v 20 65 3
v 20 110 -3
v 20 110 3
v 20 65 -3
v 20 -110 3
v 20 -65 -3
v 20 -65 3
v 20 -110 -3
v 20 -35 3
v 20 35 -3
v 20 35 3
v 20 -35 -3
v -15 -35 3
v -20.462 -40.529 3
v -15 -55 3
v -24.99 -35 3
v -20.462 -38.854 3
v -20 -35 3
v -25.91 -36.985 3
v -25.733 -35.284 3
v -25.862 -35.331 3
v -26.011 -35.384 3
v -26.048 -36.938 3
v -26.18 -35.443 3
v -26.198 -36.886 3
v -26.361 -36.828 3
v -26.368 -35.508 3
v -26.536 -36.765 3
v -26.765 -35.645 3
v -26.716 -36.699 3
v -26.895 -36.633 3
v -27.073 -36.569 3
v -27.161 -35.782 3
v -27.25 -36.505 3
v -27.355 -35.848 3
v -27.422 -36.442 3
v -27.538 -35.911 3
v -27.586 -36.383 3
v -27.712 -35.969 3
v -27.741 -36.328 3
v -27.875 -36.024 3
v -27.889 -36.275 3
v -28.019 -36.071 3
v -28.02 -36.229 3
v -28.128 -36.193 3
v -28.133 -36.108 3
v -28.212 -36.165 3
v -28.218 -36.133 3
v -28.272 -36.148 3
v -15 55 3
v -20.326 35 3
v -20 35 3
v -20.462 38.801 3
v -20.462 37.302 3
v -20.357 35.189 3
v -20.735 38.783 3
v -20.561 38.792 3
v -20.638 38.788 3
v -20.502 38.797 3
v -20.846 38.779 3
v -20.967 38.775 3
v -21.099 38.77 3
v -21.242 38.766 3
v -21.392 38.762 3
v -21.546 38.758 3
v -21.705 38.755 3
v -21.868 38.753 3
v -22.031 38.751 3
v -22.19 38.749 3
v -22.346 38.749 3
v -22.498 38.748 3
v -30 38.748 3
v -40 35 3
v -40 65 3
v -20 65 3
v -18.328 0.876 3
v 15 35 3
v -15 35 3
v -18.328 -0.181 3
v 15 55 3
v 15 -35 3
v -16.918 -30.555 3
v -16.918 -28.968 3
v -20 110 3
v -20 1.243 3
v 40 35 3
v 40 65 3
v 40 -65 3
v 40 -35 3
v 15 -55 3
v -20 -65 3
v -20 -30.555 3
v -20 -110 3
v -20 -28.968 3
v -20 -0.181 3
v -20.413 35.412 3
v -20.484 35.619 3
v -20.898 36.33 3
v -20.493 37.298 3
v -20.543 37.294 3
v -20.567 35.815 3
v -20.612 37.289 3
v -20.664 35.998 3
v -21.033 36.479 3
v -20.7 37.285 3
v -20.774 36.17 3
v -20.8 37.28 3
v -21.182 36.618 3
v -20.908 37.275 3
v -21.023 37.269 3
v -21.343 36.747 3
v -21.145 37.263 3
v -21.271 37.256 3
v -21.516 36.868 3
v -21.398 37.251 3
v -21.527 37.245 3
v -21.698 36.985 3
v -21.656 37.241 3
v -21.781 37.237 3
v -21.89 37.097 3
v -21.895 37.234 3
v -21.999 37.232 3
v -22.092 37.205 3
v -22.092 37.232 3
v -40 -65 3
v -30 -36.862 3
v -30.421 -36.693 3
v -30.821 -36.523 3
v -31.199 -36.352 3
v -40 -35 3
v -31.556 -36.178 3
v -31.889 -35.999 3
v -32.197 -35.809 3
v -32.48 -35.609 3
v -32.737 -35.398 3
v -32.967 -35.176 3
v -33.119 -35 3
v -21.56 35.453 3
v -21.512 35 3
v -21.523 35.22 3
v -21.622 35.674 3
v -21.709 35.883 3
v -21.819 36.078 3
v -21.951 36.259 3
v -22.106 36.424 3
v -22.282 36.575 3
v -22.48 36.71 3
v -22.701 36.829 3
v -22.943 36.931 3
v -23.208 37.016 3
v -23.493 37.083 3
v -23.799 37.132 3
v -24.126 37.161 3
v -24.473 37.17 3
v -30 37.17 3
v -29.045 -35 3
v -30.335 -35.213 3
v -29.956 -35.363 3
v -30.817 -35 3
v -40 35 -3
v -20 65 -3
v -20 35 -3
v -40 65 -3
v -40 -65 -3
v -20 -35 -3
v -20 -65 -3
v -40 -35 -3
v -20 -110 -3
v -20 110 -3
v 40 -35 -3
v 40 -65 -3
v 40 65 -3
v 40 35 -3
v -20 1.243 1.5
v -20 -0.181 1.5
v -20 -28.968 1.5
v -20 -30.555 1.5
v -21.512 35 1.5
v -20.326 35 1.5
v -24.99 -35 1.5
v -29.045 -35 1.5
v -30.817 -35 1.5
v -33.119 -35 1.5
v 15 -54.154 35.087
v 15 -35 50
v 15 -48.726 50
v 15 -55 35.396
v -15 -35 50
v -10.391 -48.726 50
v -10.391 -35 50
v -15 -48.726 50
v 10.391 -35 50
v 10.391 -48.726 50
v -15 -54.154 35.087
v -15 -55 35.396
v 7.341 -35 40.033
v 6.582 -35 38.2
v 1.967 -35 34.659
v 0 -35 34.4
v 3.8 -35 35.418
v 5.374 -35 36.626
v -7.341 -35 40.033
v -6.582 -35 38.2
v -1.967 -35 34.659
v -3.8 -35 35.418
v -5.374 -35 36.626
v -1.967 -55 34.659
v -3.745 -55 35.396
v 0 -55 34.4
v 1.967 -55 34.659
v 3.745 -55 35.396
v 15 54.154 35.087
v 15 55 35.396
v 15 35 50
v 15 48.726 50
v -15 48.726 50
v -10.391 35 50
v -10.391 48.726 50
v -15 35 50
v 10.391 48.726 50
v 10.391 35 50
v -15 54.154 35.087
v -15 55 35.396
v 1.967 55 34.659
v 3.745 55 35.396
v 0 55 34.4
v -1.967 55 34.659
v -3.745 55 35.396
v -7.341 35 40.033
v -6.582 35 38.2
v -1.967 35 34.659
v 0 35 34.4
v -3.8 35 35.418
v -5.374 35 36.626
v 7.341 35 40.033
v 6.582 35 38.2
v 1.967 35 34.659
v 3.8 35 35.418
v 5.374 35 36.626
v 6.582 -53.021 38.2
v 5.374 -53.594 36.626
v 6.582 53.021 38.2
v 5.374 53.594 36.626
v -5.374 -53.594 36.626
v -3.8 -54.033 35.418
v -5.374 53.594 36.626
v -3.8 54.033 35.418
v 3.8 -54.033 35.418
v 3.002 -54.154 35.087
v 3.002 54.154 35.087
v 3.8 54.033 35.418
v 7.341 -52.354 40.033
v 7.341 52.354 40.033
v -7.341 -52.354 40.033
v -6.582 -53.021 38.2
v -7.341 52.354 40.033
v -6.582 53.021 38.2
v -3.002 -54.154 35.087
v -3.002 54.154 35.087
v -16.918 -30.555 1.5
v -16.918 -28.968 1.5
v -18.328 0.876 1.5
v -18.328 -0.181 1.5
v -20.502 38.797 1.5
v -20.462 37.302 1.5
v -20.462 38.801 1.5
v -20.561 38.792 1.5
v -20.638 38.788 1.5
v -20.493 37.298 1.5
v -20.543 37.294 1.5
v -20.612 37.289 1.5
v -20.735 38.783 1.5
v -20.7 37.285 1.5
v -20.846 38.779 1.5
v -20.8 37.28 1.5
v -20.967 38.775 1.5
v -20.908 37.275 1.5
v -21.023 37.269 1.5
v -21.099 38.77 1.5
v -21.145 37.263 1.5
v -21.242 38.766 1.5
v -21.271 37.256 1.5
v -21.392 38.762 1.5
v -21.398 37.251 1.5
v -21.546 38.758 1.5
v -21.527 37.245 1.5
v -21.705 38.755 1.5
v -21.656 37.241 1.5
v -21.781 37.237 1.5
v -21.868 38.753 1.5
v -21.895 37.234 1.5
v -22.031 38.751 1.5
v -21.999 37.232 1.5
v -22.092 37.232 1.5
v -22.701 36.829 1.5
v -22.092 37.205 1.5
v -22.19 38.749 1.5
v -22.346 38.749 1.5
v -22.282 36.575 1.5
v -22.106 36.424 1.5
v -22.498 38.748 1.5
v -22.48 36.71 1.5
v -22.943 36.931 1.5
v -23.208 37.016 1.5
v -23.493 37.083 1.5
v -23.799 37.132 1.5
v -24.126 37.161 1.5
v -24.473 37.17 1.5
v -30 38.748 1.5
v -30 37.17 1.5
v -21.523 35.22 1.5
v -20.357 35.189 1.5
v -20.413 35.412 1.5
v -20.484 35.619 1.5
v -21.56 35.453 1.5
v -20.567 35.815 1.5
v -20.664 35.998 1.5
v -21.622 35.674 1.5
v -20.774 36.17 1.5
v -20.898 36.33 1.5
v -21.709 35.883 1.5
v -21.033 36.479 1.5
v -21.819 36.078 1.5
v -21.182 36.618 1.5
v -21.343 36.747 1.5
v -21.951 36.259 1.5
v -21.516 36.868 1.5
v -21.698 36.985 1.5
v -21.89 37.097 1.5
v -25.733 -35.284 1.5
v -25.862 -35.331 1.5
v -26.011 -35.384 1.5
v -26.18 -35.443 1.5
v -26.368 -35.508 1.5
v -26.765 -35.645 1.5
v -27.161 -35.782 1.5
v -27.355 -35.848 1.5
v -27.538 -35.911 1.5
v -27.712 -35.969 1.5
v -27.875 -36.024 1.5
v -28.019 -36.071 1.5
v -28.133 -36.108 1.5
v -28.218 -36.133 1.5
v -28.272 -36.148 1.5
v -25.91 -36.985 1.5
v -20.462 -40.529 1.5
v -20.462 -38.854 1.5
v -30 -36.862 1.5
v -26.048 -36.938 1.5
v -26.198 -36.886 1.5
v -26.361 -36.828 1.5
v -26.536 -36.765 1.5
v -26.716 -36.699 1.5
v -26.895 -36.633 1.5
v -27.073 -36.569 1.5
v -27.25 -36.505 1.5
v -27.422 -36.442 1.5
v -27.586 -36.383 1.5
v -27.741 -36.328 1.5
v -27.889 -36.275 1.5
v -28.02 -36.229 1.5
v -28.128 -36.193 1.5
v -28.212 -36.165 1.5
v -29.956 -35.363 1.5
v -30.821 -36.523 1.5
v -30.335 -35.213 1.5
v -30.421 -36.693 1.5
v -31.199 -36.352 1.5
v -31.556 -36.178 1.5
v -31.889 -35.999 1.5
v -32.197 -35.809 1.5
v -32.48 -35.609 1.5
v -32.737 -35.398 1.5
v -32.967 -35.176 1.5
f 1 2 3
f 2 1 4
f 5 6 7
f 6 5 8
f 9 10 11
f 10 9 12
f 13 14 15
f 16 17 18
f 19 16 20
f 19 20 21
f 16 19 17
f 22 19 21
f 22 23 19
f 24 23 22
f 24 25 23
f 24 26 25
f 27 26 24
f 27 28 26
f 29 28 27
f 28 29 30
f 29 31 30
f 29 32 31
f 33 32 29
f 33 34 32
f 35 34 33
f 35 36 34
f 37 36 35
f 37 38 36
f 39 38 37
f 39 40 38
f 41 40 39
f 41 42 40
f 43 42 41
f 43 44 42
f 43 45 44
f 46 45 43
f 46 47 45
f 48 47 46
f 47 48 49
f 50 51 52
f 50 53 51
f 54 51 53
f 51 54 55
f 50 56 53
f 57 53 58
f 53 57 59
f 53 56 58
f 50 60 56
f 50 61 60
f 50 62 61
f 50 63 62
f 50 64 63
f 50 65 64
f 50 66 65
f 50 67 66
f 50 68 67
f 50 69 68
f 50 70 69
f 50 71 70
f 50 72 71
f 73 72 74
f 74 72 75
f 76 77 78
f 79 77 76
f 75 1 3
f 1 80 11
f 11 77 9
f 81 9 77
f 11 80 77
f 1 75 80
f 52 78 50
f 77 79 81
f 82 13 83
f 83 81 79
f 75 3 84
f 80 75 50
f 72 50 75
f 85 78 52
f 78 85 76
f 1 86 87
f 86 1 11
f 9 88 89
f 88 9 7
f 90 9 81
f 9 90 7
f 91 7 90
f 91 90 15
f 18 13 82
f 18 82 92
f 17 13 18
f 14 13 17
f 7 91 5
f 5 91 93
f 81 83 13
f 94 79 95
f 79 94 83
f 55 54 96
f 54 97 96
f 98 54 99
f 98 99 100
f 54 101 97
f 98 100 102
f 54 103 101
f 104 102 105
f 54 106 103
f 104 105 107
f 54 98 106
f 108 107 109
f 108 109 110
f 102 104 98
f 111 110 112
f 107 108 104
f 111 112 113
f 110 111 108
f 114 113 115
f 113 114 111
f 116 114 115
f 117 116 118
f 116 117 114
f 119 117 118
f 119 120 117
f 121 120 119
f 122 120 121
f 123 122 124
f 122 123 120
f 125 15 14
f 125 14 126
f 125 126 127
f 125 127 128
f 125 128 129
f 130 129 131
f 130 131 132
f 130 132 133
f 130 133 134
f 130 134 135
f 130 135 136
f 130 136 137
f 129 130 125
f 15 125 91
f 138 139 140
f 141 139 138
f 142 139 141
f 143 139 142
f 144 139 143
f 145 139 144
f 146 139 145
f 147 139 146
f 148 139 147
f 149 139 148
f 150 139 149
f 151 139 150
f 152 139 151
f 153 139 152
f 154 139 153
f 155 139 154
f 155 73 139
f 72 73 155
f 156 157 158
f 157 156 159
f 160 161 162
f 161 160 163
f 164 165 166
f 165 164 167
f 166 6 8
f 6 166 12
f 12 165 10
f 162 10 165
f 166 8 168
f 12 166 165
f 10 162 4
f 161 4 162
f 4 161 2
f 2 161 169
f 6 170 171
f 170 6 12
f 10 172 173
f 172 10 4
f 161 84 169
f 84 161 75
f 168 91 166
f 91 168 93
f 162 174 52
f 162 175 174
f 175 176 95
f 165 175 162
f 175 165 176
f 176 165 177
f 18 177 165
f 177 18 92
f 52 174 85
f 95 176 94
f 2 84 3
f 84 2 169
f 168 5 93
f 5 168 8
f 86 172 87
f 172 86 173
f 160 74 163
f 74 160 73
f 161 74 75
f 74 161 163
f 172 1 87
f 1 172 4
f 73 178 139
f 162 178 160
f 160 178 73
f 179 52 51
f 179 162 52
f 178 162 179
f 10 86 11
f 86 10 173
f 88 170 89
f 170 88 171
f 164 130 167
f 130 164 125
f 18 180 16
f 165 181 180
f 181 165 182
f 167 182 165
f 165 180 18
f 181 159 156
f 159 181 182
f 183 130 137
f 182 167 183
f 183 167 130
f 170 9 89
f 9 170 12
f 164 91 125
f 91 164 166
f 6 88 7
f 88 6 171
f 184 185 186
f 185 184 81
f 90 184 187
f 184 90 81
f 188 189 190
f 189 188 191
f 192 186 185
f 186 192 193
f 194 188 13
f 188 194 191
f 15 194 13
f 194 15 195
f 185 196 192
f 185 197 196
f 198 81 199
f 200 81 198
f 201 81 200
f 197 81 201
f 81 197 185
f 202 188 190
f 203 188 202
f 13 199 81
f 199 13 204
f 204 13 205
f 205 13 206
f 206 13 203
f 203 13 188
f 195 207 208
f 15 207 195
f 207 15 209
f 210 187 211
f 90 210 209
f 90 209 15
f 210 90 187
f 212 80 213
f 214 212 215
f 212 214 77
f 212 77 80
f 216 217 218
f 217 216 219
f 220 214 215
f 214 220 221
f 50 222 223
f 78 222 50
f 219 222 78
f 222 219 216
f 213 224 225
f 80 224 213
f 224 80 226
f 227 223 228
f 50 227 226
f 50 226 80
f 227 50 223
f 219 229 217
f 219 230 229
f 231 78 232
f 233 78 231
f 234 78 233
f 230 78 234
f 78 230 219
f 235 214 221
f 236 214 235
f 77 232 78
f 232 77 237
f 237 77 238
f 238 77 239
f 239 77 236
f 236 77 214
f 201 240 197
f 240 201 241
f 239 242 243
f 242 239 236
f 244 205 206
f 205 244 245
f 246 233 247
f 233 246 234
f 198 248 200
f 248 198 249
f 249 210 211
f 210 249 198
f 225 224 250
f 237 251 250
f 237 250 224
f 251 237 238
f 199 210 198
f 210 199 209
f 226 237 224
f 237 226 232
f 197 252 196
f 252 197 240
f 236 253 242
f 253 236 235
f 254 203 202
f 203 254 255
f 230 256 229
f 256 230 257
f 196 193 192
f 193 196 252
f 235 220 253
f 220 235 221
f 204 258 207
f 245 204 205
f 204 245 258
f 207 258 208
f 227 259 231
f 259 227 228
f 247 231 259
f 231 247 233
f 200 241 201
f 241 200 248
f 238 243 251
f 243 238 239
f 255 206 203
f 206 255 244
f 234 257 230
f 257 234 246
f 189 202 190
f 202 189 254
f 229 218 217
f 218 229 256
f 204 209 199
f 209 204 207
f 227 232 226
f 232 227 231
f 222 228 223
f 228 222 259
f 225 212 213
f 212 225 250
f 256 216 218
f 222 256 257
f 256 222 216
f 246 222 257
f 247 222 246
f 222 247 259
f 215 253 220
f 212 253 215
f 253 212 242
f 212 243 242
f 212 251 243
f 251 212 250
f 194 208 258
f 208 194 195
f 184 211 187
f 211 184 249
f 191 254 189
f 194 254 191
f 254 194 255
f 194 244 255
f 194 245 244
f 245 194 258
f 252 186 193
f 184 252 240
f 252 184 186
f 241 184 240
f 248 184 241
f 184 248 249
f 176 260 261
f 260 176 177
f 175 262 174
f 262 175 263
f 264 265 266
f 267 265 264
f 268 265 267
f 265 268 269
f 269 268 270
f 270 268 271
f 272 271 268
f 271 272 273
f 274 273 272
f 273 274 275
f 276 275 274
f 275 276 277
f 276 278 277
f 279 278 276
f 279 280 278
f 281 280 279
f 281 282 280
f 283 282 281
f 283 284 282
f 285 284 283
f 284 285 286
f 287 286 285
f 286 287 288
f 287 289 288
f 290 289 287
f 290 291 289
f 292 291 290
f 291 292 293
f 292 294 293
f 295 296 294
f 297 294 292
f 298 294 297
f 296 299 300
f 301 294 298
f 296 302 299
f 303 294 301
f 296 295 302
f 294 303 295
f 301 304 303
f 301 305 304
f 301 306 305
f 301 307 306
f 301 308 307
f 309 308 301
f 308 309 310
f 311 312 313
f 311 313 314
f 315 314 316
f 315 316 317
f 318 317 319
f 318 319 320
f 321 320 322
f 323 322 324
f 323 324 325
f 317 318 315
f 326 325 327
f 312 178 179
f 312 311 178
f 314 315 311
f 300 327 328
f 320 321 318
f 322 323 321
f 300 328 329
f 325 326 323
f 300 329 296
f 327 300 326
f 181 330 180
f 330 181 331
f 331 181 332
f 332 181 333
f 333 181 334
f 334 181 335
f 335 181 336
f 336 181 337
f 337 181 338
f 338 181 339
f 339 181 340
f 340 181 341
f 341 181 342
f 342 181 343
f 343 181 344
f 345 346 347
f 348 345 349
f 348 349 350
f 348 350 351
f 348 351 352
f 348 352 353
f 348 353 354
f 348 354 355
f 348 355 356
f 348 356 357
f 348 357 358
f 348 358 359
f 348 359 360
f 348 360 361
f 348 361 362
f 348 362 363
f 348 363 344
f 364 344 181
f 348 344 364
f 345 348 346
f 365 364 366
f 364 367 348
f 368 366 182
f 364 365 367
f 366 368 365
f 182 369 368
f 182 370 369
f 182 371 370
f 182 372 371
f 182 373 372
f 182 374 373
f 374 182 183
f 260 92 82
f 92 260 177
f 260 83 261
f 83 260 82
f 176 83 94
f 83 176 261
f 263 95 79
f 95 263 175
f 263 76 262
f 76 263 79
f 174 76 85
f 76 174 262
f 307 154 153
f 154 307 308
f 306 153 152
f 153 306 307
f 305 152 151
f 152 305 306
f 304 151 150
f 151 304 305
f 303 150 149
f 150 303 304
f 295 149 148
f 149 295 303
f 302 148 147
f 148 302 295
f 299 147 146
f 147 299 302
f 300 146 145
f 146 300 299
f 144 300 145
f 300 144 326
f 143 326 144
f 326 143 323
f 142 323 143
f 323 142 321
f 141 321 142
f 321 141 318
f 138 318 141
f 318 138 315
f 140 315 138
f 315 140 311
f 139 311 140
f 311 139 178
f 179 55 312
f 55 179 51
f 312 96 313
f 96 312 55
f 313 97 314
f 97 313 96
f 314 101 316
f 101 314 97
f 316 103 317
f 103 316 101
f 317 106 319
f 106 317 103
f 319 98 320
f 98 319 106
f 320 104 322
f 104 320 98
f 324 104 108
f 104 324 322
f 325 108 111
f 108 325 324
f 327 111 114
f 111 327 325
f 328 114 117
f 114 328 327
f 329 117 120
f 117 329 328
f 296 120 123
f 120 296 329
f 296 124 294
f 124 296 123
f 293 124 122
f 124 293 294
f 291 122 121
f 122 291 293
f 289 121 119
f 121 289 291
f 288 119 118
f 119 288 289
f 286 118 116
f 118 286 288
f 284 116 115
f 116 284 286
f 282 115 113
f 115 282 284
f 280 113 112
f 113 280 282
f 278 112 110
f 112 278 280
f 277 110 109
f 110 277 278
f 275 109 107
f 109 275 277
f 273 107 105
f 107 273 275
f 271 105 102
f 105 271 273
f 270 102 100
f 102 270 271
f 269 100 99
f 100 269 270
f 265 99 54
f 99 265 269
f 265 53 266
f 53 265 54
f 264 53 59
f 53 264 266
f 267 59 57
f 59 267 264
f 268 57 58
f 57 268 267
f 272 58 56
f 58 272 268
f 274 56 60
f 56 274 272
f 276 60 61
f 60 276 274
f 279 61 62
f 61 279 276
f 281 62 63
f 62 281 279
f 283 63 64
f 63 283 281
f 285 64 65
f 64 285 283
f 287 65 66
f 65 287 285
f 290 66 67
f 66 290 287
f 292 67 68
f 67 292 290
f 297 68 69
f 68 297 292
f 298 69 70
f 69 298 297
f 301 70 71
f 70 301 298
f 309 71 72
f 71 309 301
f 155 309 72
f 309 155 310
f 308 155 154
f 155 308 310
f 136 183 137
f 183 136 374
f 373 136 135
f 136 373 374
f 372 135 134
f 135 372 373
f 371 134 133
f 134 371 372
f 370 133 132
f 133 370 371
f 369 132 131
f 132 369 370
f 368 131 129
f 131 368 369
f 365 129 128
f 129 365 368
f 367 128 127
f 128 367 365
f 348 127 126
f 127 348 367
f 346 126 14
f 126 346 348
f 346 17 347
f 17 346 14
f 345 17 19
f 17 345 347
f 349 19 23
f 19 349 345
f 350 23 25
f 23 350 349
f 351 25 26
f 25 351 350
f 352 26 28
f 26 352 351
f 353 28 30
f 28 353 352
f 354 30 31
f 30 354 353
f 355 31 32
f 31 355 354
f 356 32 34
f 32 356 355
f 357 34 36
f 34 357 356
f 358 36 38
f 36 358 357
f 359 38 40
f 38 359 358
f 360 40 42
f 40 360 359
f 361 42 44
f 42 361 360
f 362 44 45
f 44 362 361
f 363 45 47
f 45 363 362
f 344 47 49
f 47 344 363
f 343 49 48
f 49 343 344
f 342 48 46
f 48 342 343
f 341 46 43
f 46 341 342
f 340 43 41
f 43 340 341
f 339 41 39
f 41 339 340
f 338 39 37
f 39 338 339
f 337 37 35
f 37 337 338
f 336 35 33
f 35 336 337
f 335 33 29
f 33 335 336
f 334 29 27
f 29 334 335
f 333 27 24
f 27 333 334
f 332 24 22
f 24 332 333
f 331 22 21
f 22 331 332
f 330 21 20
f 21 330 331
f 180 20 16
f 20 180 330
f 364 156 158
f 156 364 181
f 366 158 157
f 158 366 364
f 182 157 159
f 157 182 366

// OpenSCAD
boostFrontAxelLength=110;
baseThickness=6;

difference() {

  union() {
    // left fork
    translate([0, -boostFrontAxelLength/2 + 10, 25])
    cube([30, 20, 50], center=true);

    // left right
    translate([0, boostFrontAxelLength/2 - 10, 25])
    cube([30, 20, 50], center=true);

    // base shapes
    union() {
    //color([1,0,0])
    cube([40, 220, baseThickness], center = true);

    translate([0, 50, 0])
    cube([80, 30, baseThickness], center=true);

    translate([0, -50, 0])
    cube([80, 30, baseThickness], center=true);
    }
  }

  // slot cutout thingy
  translate([0, 0, 42])
  rotate([90 ,0, 0])
  hull() {
    cylinder(h=boostFrontAxelLength+1, r=15.2/2, center=true);

    translate([0, 20, 0])
    cylinder(h=boostFrontAxelLength+1, r=27/2, center=true);
  }

  // left shoulder cutout
  translate([0, boostFrontAxelLength/2, 62])
  rotate([20])
  cube([32, 20, 50], center=true);

  // right shoulder cutout
  translate([0, -boostFrontAxelLength/2, 62])
  rotate([-20])
  cube([32, 20, 50], center=true);

  rotate([0,0, -90])
  translate([-40, -30, 1.5])
  linear_extrude(height=2)
  text("mc standy", 13, "Arial");
}
